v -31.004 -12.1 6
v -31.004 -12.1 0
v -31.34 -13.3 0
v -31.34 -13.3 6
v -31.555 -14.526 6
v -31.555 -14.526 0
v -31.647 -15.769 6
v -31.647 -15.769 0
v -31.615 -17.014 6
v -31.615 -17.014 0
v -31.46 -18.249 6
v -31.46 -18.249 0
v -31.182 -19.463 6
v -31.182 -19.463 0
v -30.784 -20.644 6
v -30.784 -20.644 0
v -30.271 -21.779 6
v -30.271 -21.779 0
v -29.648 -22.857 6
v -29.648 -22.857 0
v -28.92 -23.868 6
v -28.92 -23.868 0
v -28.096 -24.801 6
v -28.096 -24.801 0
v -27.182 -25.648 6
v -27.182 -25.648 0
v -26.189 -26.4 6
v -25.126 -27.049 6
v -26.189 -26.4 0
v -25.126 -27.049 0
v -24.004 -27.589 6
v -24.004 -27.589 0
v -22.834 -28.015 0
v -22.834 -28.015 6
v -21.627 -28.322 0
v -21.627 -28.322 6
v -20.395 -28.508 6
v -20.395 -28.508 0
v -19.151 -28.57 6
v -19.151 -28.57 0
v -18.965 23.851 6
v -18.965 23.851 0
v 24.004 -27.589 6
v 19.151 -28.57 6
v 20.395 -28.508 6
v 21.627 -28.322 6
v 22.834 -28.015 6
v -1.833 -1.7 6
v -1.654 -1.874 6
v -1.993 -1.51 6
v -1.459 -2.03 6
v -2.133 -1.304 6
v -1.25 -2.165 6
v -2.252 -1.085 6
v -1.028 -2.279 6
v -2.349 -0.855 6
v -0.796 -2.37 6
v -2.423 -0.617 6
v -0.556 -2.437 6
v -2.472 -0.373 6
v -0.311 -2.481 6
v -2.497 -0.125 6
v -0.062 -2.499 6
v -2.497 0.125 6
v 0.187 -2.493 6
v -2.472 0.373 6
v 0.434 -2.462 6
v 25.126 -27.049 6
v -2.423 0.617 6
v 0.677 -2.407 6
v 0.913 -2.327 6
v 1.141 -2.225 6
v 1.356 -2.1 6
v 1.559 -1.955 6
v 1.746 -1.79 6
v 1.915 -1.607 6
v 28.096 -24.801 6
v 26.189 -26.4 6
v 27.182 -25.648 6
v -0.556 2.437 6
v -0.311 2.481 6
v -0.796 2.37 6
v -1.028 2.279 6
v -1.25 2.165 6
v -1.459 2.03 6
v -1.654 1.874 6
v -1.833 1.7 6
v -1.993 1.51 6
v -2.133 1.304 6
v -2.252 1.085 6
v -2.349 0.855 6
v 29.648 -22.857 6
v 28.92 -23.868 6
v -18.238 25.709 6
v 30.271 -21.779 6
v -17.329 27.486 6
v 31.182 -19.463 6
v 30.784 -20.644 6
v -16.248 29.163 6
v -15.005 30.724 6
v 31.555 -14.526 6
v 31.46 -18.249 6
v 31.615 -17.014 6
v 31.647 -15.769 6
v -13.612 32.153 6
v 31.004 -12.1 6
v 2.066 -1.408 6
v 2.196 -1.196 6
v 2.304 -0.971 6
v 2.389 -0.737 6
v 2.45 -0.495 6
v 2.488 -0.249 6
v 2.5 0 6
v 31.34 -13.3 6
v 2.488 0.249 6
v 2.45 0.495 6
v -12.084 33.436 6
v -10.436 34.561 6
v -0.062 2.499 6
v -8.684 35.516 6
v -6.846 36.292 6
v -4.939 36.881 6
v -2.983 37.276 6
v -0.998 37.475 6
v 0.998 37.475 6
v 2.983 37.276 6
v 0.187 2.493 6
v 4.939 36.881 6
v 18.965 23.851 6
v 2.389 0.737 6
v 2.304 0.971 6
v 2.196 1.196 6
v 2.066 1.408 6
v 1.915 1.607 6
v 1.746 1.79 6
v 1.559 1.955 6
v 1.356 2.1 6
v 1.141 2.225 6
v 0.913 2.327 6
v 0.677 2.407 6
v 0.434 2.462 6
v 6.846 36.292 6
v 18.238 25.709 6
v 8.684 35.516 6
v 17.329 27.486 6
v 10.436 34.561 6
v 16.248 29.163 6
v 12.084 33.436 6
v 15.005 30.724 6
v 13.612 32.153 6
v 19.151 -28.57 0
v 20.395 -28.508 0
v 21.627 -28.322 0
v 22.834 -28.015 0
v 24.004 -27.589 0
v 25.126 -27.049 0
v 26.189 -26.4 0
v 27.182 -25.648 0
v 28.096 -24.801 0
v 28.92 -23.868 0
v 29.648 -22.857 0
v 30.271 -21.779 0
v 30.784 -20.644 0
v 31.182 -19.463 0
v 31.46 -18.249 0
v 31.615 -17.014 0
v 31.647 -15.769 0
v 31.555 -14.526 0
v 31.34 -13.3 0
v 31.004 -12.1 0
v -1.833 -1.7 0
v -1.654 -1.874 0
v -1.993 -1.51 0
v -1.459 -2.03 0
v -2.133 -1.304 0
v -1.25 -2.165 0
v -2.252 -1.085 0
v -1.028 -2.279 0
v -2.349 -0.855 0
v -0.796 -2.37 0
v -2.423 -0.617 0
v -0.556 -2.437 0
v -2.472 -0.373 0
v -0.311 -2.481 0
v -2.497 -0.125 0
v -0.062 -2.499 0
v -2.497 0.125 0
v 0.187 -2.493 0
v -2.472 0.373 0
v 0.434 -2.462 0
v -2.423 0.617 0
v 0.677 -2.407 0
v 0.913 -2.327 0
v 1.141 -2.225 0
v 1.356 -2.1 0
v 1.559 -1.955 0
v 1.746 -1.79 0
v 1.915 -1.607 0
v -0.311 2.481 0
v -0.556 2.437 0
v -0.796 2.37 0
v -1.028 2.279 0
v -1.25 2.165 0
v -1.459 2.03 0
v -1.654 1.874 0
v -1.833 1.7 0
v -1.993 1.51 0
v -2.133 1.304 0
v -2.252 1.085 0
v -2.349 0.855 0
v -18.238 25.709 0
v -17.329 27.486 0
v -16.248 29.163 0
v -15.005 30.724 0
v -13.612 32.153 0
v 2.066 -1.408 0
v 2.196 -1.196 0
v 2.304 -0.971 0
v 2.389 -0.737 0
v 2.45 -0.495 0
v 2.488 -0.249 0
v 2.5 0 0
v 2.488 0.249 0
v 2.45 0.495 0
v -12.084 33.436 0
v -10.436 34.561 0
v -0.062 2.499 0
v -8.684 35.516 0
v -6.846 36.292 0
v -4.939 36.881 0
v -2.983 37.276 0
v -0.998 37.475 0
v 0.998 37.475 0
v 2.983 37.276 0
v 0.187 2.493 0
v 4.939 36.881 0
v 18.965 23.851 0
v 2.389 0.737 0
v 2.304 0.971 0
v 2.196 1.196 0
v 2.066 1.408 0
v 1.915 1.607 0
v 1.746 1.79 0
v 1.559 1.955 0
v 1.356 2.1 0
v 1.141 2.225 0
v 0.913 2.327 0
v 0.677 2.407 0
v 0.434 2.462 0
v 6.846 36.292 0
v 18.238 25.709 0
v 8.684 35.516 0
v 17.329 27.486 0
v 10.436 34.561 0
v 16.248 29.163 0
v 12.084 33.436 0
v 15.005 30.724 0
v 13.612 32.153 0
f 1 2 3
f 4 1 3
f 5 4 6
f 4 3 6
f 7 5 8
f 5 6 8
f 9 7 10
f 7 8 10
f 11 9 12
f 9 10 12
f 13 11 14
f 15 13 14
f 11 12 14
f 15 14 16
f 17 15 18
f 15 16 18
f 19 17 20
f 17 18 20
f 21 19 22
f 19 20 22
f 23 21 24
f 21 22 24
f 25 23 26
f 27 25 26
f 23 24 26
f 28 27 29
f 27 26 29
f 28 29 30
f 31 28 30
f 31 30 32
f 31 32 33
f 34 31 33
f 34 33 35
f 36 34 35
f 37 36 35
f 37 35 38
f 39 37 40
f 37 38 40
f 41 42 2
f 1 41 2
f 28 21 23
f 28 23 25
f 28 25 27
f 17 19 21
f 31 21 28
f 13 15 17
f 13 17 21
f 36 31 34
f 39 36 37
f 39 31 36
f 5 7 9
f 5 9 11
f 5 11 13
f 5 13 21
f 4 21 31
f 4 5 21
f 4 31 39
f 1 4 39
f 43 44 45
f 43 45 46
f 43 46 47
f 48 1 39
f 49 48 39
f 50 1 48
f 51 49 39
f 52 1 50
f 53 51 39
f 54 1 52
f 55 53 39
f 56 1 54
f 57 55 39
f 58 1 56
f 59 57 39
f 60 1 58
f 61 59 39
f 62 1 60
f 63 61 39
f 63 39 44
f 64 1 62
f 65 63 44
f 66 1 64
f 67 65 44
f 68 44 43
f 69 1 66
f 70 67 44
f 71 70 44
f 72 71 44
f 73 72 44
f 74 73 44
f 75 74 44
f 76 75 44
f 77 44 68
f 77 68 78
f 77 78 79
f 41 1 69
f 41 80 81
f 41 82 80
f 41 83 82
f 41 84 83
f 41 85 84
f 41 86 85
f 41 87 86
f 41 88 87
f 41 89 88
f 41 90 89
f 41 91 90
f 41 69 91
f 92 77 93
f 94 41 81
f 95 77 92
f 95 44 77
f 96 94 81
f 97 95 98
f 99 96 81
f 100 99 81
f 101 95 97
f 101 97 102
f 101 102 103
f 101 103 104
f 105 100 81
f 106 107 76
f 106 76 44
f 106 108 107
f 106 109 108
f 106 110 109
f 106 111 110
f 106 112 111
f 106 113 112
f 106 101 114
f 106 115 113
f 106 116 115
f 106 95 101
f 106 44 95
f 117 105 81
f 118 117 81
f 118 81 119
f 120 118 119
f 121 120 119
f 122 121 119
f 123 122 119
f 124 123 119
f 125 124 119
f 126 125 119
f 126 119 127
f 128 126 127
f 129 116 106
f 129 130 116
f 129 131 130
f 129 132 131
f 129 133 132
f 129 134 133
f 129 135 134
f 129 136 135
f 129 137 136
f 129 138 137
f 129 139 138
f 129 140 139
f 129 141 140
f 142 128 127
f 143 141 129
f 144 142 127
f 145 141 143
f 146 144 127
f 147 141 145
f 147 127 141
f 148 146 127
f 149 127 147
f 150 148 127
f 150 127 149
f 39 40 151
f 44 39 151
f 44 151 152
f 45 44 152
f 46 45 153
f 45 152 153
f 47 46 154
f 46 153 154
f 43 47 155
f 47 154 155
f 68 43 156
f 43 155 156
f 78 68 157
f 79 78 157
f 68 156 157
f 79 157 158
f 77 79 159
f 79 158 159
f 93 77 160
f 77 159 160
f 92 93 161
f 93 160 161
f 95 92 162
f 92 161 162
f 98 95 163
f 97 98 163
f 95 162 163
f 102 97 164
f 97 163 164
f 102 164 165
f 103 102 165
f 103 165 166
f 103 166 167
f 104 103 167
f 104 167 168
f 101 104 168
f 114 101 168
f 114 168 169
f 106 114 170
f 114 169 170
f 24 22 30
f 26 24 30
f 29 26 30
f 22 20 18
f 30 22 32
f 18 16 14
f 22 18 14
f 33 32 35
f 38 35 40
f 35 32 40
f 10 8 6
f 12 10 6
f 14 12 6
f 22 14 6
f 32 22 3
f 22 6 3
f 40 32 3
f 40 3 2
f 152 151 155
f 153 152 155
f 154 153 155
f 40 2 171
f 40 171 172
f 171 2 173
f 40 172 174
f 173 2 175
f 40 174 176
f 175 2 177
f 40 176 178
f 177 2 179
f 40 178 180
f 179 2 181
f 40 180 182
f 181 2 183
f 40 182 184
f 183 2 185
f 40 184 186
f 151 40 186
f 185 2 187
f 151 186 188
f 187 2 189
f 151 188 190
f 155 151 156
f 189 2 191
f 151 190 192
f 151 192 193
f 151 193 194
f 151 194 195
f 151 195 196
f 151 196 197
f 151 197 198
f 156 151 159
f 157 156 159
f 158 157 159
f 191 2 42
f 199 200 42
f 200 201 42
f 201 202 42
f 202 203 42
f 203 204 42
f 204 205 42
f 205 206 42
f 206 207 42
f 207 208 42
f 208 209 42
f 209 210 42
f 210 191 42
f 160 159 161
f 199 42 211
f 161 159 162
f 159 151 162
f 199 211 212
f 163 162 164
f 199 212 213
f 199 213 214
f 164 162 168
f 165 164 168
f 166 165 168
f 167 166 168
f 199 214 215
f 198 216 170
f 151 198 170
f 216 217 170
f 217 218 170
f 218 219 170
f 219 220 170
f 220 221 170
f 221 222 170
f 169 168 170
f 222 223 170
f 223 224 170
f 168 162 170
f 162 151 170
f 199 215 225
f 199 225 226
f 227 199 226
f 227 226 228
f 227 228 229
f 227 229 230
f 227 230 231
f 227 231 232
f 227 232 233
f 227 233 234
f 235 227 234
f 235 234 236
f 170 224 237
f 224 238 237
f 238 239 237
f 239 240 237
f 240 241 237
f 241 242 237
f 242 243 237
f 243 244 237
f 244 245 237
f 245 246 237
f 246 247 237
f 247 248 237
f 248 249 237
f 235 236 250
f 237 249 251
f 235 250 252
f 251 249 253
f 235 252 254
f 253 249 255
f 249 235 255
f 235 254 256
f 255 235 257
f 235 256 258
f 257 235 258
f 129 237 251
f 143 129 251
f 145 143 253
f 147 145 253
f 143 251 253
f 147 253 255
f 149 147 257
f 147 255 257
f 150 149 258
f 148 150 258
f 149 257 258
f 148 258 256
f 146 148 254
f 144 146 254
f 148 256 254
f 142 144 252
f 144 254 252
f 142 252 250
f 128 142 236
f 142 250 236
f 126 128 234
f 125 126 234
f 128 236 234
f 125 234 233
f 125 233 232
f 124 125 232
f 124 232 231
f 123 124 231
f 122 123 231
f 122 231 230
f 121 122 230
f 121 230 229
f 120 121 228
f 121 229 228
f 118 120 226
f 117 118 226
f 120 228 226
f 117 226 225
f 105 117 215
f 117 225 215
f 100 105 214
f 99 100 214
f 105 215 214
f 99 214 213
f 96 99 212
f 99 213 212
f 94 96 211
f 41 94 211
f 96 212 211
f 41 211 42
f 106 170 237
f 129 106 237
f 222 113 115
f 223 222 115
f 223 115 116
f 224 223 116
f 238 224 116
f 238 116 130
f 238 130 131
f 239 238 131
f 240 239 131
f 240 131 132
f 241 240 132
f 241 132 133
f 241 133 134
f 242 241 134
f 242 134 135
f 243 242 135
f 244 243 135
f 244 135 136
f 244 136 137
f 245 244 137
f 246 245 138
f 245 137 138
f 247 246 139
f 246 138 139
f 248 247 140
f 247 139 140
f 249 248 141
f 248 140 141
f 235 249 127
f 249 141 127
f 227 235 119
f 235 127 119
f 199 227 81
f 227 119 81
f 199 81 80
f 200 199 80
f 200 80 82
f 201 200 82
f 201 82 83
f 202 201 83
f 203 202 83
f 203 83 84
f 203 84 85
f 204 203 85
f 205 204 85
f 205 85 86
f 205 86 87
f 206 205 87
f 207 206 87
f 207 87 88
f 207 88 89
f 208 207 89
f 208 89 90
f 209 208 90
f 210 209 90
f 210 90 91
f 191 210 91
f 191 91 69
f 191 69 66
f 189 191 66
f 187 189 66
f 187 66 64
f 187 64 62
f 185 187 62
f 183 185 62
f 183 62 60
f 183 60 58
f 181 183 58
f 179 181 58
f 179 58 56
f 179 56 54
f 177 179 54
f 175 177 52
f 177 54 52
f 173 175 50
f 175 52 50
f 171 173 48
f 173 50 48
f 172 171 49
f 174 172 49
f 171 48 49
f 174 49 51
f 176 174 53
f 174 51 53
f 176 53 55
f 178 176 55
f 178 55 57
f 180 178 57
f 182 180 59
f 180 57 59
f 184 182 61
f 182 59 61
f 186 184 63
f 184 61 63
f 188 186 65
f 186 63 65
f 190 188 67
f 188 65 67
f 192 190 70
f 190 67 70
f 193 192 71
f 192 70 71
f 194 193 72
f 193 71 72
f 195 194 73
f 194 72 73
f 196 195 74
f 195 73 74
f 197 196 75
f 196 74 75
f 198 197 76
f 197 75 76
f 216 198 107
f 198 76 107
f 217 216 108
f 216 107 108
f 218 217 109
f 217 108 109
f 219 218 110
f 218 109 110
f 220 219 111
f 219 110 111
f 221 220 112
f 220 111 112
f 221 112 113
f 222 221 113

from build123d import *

# Parameters (mm, degrees)
EXTRUDE_1_DEPTH     = 6
SKETCH_3_R          = 2.5
CUT_EXTRUDE_1_DEPTH = 50.437261579


with BuildPart() as part:
    # Эскиз1 → Бобышка-Вытянуть1 (new body)
    with BuildSketch(Plane.XY):
        with BuildLine():
            ThreePointArc((18.964860111, 23.850911821), (0, 37.5), (-18.964860111, 23.850911821))
            Line((-18.964860111, 23.850911821), (-31.004148648, -12.100370354))
            ThreePointArc((-31.004148648, -12.100370354), (-29.296713539, -23.371522252), (-19.151111078, -28.569690242))
            Line((-19.151111078, -28.569690242), (19.151111078, -28.569690242))
            ThreePointArc((19.151111078, -28.569690242), (29.296713539, -23.371522252), (31.004148648, -12.100370354))
            Line((31.004148648, -12.100370354), (18.964860111, 23.850911821))
        make_face()
    extrude(amount=EXTRUDE_1_DEPTH)

    # Эскиз3 → Вырез-Вытянуть1 (cut, through all)
    with BuildSketch(Plane.XY.offset(6)):
        Circle(SKETCH_3_R)
    extrude(amount=-CUT_EXTRUDE_1_DEPTH, mode=Mode.SUBTRACT)


solid = part.part
